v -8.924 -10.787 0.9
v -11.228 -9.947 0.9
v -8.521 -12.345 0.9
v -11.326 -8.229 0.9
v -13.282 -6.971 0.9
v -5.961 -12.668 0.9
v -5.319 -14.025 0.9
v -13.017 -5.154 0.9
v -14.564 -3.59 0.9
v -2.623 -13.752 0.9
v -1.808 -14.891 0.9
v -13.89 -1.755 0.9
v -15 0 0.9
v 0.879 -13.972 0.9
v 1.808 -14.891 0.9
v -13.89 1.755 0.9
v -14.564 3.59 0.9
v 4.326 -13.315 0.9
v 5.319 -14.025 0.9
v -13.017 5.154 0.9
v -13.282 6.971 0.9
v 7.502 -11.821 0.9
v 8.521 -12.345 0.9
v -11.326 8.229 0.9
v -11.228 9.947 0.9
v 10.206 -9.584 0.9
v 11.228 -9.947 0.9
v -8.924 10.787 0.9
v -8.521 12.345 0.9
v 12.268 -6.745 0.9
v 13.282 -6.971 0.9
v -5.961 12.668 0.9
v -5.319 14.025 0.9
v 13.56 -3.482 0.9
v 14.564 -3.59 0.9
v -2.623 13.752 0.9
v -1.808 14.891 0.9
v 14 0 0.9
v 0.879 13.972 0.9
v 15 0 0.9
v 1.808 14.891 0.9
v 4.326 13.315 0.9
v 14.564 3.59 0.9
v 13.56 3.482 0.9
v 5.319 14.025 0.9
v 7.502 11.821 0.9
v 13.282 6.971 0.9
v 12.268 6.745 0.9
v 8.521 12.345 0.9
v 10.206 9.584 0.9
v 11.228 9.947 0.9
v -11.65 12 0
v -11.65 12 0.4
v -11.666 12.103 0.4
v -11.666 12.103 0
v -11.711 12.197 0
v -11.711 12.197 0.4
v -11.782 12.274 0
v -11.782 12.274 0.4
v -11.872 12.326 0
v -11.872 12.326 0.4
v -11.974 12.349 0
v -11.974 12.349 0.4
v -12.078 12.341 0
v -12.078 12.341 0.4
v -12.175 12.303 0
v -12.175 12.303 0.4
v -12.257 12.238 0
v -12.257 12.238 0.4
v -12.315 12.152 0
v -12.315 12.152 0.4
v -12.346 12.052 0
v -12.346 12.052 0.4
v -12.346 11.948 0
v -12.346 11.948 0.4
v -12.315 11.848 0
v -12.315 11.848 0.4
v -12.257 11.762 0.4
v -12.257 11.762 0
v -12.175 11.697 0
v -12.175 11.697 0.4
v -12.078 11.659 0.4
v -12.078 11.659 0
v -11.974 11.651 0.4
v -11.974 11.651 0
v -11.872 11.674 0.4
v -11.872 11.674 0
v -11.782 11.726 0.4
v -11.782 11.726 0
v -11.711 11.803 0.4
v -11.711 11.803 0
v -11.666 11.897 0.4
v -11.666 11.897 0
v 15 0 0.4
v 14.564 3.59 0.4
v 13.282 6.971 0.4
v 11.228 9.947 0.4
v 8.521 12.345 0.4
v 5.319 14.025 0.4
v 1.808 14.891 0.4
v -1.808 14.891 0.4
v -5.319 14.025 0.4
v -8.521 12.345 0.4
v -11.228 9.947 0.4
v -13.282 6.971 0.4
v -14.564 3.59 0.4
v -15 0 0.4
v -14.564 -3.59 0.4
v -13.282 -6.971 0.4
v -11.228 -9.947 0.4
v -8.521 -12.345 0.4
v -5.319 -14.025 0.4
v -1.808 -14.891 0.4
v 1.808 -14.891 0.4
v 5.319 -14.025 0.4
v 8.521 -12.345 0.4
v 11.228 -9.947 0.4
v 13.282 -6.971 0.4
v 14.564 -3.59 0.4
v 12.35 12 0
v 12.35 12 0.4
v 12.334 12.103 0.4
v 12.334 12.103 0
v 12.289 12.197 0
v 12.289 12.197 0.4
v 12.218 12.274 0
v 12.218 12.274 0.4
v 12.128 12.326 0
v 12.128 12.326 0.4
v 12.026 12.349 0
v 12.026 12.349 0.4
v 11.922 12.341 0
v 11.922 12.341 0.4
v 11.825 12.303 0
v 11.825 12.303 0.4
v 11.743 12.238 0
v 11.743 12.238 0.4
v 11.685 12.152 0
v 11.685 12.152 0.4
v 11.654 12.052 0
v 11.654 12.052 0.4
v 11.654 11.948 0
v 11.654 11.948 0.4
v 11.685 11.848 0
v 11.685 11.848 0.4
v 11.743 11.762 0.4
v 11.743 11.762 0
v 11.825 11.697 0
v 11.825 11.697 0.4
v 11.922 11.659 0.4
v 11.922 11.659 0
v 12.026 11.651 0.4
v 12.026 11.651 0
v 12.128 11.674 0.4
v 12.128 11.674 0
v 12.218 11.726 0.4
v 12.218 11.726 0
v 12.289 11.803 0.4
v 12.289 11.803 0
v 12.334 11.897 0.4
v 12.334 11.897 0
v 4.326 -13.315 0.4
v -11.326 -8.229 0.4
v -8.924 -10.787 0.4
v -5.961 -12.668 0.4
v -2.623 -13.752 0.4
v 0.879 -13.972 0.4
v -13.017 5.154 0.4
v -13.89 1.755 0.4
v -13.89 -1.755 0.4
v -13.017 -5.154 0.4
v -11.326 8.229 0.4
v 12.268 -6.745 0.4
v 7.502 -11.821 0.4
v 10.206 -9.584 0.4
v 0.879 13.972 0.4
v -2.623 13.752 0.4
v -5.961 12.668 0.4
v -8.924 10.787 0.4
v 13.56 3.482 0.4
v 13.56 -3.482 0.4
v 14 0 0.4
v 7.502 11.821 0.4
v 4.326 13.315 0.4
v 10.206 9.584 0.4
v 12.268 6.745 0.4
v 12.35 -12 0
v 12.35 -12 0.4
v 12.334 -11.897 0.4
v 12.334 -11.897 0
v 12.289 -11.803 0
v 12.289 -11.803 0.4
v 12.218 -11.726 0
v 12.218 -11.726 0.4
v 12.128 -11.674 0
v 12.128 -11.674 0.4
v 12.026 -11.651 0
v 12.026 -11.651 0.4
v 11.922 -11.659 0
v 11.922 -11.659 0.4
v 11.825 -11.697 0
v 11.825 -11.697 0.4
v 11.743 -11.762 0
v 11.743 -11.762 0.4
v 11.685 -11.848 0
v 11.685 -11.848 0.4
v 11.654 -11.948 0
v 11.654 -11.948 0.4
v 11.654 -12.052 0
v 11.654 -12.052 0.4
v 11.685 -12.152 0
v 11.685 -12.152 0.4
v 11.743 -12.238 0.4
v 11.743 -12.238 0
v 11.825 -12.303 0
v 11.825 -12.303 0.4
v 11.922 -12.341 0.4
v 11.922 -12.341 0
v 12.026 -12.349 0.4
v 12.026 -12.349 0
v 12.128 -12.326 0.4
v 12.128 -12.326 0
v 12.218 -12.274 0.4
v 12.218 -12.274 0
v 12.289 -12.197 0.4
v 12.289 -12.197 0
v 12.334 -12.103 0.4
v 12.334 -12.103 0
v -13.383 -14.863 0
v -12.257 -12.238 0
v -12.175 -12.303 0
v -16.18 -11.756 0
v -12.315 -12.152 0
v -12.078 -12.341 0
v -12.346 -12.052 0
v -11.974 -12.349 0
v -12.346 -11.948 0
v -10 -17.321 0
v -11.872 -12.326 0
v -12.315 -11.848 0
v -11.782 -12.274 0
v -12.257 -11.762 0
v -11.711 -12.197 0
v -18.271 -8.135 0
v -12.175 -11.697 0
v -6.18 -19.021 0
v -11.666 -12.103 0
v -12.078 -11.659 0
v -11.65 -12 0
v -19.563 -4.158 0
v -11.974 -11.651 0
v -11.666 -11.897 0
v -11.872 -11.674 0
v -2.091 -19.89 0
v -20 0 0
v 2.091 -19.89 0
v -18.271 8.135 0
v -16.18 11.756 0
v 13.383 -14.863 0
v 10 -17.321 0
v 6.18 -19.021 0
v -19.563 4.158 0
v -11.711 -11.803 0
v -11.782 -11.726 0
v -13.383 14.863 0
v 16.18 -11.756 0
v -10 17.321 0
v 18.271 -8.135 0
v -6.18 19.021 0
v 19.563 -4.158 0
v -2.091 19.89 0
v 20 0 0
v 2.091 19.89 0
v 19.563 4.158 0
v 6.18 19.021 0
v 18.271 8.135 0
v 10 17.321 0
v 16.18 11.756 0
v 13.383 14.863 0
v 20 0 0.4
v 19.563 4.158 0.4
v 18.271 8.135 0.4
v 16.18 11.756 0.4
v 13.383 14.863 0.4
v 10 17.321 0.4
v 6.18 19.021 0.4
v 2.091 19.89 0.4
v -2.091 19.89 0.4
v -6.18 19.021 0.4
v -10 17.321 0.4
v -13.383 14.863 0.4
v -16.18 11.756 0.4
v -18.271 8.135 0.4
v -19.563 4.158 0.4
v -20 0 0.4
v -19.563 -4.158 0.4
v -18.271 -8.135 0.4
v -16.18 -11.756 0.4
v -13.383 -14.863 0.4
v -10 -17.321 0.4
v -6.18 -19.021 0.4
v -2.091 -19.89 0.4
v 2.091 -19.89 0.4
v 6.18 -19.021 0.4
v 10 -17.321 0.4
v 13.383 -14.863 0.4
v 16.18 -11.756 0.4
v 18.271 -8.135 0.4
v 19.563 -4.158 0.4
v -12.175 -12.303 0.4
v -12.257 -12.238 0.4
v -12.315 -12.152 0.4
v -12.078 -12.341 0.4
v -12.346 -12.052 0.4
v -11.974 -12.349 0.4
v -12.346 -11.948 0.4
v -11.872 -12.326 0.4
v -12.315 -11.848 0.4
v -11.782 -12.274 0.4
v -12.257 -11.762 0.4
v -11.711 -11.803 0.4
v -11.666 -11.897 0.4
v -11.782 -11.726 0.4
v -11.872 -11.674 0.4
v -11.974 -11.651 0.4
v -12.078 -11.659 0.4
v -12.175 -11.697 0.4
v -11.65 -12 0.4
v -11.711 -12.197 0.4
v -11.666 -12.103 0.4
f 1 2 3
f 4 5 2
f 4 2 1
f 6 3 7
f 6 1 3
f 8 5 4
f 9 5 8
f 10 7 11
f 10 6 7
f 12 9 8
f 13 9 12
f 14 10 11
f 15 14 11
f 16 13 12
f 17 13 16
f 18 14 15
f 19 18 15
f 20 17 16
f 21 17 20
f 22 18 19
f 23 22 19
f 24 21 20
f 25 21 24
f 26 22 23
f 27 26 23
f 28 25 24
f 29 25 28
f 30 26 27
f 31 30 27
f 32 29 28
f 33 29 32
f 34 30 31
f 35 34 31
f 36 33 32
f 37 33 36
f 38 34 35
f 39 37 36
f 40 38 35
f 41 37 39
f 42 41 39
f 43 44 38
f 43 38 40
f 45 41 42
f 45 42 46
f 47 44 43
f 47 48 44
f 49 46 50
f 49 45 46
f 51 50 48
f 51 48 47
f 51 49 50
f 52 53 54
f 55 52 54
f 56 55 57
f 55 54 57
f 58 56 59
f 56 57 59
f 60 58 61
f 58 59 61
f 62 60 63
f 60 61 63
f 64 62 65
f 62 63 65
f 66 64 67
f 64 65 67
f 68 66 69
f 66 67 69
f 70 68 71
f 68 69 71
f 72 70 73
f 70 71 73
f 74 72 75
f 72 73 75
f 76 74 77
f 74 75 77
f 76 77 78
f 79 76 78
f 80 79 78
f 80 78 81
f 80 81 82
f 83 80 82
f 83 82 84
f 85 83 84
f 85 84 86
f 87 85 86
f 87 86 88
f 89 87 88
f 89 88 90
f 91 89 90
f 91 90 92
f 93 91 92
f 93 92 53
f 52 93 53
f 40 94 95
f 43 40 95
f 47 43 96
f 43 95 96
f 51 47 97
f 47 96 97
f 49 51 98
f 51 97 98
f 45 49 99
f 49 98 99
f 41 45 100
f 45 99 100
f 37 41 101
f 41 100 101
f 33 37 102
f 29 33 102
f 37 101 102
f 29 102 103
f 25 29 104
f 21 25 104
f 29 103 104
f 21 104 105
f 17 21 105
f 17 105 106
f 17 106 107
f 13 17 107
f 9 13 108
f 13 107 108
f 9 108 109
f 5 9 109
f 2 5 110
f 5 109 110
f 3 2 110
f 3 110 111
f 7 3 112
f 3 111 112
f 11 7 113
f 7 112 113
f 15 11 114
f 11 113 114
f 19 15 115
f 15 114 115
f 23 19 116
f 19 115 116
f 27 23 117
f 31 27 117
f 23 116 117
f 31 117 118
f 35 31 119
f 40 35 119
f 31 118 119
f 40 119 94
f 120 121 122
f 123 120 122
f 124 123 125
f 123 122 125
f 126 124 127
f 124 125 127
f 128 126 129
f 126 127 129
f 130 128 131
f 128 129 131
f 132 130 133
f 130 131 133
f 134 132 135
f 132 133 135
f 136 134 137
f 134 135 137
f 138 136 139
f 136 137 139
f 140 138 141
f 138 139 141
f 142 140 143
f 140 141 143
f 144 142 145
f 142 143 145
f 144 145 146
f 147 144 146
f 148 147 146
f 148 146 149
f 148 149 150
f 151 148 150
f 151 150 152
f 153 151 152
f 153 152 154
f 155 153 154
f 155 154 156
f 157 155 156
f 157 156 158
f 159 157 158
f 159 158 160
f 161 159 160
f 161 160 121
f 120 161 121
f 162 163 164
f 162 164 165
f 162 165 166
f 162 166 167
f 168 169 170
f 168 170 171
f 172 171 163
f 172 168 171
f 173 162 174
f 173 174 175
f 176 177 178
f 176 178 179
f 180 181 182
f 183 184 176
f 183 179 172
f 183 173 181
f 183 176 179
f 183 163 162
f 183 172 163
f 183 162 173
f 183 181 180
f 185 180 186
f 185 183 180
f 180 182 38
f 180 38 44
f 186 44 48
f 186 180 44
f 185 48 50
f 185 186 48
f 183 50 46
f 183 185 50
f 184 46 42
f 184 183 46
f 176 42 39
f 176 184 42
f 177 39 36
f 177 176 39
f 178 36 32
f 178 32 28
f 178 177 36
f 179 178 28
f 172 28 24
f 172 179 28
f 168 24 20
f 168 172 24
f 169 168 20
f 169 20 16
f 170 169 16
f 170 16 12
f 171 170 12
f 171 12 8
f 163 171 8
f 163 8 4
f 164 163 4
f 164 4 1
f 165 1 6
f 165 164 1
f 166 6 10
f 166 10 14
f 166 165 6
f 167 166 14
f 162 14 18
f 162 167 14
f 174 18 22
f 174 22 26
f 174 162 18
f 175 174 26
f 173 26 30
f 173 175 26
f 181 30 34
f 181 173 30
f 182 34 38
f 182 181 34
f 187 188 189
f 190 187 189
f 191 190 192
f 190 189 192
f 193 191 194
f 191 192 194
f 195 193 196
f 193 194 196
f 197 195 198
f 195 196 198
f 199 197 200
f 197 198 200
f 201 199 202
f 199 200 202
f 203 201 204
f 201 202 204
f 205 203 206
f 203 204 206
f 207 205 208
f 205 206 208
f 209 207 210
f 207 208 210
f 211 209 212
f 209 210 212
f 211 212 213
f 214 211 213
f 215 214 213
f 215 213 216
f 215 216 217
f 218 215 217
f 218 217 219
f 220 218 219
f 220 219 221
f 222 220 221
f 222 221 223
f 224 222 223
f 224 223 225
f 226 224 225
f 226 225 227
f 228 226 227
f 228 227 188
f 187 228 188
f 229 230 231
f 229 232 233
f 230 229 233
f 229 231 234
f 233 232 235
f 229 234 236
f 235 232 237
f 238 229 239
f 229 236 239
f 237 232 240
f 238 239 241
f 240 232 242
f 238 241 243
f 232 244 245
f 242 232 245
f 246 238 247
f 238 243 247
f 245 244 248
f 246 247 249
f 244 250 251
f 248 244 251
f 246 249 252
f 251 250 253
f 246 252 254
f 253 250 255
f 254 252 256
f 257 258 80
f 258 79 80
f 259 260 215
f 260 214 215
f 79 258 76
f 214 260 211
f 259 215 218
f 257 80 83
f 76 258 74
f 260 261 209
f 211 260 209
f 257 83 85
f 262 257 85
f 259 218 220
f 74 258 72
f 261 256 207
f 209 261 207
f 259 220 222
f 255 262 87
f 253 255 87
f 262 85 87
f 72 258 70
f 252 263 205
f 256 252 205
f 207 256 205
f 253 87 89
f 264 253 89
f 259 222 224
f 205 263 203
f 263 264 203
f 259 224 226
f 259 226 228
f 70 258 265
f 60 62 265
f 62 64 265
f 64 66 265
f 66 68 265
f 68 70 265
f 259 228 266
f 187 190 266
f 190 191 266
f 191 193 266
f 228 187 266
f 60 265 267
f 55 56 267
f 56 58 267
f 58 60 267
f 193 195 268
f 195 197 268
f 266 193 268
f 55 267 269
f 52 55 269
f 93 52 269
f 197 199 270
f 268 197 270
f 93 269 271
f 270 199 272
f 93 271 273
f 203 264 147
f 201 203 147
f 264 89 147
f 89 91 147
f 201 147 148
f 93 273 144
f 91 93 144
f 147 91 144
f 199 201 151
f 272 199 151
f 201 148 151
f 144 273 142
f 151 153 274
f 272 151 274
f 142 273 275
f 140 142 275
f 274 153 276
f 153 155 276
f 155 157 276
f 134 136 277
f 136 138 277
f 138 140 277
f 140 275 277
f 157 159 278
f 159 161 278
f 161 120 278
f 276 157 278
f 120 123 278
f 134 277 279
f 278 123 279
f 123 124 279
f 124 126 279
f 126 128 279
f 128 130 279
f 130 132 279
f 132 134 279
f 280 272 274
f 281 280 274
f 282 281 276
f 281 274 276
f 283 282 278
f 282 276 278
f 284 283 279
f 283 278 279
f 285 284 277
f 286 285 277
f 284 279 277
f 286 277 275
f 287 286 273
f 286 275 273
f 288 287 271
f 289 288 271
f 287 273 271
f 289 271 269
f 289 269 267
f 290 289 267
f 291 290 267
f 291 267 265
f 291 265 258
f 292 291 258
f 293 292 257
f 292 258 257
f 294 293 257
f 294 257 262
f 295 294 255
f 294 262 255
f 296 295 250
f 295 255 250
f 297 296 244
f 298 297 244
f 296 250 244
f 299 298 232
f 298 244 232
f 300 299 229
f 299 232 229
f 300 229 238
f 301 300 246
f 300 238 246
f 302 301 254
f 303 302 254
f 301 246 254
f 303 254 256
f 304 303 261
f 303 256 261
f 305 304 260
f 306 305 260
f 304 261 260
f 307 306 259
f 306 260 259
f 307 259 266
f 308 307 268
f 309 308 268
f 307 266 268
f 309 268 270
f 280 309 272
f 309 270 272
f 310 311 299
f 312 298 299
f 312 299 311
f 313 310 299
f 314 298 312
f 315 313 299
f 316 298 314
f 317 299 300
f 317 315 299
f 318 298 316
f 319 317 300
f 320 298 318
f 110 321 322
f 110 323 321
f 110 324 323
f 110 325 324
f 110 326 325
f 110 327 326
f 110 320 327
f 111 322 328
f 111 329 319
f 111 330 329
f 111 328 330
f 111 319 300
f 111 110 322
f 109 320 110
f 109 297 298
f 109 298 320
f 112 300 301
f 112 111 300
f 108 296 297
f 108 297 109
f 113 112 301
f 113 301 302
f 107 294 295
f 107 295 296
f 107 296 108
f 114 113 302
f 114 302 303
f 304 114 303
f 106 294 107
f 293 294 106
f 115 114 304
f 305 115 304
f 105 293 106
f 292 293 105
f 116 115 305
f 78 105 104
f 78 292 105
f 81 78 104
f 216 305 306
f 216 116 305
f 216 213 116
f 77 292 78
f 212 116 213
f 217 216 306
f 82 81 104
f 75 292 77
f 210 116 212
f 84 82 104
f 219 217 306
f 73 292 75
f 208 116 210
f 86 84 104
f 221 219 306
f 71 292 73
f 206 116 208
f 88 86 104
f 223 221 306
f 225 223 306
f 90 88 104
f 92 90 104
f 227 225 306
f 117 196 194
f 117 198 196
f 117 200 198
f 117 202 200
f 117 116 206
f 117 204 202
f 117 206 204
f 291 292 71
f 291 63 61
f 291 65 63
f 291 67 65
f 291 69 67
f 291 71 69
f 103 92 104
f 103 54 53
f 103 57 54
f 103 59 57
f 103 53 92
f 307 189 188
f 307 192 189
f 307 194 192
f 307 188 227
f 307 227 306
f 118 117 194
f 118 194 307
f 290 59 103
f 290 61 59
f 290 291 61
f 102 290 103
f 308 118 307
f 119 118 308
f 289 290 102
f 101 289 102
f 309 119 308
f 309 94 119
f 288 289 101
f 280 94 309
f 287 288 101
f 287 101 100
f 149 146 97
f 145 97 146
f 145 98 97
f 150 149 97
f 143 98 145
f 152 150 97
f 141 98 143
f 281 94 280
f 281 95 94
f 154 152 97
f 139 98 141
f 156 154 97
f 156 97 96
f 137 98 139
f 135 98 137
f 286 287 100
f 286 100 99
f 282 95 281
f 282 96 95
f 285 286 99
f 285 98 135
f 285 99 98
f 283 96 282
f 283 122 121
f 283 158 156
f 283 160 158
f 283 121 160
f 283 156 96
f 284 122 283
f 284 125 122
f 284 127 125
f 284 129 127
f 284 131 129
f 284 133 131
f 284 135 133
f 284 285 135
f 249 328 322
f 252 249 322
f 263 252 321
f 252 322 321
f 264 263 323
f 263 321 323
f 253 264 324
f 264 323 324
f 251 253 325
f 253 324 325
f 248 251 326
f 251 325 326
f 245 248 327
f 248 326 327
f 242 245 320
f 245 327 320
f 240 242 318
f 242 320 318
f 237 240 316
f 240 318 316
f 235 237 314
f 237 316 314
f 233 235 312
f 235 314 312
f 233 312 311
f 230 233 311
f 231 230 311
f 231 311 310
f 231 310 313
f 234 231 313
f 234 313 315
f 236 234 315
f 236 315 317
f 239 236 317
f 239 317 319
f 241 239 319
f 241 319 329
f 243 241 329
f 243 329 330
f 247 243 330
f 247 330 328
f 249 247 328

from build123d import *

# Parameters (mm, degrees)
CROQUIS1_R              = 20
SALIENTE_EXTRUIR1_DEPTH = 0.4
CROQUIS3_R              = 0.35
CORTAR_EXTRUIR1_DEPTH   = 10
CROQUIS2_R              = 15
CROQUIS2_R_2            = 14
SALIENTE_EXTRUIR2_DEPTH = 0.5


with BuildPart() as part:
    # Croquis1 → Saliente-Extruir1 (new body)
    with BuildSketch(Plane.XY):
        Circle(CROQUIS1_R)
    extrude(amount=SALIENTE_EXTRUIR1_DEPTH)

    # Croquis3 → Cortar-Extruir1 (cut)
    with BuildSketch(Plane.XY.offset(0.4)):
        with Locations((12, 12)):
            Circle(CROQUIS3_R)
        with Locations((-12, 12)):
            Circle(CROQUIS3_R)
        with Locations((12, -12)):
            Circle(CROQUIS3_R)
        with Locations((-12, -12)):
            Circle(CROQUIS3_R)
    extrude(amount=-CORTAR_EXTRUIR1_DEPTH, mode=Mode.SUBTRACT)

    # Croquis2 → Saliente-Extruir2 (add)
    with BuildSketch(Plane.XY.offset(0.4)):
        Circle(CROQUIS2_R)
        Circle(CROQUIS2_R_2, mode=Mode.SUBTRACT)
    extrude(amount=SALIENTE_EXTRUIR2_DEPTH)


solid = part.part
